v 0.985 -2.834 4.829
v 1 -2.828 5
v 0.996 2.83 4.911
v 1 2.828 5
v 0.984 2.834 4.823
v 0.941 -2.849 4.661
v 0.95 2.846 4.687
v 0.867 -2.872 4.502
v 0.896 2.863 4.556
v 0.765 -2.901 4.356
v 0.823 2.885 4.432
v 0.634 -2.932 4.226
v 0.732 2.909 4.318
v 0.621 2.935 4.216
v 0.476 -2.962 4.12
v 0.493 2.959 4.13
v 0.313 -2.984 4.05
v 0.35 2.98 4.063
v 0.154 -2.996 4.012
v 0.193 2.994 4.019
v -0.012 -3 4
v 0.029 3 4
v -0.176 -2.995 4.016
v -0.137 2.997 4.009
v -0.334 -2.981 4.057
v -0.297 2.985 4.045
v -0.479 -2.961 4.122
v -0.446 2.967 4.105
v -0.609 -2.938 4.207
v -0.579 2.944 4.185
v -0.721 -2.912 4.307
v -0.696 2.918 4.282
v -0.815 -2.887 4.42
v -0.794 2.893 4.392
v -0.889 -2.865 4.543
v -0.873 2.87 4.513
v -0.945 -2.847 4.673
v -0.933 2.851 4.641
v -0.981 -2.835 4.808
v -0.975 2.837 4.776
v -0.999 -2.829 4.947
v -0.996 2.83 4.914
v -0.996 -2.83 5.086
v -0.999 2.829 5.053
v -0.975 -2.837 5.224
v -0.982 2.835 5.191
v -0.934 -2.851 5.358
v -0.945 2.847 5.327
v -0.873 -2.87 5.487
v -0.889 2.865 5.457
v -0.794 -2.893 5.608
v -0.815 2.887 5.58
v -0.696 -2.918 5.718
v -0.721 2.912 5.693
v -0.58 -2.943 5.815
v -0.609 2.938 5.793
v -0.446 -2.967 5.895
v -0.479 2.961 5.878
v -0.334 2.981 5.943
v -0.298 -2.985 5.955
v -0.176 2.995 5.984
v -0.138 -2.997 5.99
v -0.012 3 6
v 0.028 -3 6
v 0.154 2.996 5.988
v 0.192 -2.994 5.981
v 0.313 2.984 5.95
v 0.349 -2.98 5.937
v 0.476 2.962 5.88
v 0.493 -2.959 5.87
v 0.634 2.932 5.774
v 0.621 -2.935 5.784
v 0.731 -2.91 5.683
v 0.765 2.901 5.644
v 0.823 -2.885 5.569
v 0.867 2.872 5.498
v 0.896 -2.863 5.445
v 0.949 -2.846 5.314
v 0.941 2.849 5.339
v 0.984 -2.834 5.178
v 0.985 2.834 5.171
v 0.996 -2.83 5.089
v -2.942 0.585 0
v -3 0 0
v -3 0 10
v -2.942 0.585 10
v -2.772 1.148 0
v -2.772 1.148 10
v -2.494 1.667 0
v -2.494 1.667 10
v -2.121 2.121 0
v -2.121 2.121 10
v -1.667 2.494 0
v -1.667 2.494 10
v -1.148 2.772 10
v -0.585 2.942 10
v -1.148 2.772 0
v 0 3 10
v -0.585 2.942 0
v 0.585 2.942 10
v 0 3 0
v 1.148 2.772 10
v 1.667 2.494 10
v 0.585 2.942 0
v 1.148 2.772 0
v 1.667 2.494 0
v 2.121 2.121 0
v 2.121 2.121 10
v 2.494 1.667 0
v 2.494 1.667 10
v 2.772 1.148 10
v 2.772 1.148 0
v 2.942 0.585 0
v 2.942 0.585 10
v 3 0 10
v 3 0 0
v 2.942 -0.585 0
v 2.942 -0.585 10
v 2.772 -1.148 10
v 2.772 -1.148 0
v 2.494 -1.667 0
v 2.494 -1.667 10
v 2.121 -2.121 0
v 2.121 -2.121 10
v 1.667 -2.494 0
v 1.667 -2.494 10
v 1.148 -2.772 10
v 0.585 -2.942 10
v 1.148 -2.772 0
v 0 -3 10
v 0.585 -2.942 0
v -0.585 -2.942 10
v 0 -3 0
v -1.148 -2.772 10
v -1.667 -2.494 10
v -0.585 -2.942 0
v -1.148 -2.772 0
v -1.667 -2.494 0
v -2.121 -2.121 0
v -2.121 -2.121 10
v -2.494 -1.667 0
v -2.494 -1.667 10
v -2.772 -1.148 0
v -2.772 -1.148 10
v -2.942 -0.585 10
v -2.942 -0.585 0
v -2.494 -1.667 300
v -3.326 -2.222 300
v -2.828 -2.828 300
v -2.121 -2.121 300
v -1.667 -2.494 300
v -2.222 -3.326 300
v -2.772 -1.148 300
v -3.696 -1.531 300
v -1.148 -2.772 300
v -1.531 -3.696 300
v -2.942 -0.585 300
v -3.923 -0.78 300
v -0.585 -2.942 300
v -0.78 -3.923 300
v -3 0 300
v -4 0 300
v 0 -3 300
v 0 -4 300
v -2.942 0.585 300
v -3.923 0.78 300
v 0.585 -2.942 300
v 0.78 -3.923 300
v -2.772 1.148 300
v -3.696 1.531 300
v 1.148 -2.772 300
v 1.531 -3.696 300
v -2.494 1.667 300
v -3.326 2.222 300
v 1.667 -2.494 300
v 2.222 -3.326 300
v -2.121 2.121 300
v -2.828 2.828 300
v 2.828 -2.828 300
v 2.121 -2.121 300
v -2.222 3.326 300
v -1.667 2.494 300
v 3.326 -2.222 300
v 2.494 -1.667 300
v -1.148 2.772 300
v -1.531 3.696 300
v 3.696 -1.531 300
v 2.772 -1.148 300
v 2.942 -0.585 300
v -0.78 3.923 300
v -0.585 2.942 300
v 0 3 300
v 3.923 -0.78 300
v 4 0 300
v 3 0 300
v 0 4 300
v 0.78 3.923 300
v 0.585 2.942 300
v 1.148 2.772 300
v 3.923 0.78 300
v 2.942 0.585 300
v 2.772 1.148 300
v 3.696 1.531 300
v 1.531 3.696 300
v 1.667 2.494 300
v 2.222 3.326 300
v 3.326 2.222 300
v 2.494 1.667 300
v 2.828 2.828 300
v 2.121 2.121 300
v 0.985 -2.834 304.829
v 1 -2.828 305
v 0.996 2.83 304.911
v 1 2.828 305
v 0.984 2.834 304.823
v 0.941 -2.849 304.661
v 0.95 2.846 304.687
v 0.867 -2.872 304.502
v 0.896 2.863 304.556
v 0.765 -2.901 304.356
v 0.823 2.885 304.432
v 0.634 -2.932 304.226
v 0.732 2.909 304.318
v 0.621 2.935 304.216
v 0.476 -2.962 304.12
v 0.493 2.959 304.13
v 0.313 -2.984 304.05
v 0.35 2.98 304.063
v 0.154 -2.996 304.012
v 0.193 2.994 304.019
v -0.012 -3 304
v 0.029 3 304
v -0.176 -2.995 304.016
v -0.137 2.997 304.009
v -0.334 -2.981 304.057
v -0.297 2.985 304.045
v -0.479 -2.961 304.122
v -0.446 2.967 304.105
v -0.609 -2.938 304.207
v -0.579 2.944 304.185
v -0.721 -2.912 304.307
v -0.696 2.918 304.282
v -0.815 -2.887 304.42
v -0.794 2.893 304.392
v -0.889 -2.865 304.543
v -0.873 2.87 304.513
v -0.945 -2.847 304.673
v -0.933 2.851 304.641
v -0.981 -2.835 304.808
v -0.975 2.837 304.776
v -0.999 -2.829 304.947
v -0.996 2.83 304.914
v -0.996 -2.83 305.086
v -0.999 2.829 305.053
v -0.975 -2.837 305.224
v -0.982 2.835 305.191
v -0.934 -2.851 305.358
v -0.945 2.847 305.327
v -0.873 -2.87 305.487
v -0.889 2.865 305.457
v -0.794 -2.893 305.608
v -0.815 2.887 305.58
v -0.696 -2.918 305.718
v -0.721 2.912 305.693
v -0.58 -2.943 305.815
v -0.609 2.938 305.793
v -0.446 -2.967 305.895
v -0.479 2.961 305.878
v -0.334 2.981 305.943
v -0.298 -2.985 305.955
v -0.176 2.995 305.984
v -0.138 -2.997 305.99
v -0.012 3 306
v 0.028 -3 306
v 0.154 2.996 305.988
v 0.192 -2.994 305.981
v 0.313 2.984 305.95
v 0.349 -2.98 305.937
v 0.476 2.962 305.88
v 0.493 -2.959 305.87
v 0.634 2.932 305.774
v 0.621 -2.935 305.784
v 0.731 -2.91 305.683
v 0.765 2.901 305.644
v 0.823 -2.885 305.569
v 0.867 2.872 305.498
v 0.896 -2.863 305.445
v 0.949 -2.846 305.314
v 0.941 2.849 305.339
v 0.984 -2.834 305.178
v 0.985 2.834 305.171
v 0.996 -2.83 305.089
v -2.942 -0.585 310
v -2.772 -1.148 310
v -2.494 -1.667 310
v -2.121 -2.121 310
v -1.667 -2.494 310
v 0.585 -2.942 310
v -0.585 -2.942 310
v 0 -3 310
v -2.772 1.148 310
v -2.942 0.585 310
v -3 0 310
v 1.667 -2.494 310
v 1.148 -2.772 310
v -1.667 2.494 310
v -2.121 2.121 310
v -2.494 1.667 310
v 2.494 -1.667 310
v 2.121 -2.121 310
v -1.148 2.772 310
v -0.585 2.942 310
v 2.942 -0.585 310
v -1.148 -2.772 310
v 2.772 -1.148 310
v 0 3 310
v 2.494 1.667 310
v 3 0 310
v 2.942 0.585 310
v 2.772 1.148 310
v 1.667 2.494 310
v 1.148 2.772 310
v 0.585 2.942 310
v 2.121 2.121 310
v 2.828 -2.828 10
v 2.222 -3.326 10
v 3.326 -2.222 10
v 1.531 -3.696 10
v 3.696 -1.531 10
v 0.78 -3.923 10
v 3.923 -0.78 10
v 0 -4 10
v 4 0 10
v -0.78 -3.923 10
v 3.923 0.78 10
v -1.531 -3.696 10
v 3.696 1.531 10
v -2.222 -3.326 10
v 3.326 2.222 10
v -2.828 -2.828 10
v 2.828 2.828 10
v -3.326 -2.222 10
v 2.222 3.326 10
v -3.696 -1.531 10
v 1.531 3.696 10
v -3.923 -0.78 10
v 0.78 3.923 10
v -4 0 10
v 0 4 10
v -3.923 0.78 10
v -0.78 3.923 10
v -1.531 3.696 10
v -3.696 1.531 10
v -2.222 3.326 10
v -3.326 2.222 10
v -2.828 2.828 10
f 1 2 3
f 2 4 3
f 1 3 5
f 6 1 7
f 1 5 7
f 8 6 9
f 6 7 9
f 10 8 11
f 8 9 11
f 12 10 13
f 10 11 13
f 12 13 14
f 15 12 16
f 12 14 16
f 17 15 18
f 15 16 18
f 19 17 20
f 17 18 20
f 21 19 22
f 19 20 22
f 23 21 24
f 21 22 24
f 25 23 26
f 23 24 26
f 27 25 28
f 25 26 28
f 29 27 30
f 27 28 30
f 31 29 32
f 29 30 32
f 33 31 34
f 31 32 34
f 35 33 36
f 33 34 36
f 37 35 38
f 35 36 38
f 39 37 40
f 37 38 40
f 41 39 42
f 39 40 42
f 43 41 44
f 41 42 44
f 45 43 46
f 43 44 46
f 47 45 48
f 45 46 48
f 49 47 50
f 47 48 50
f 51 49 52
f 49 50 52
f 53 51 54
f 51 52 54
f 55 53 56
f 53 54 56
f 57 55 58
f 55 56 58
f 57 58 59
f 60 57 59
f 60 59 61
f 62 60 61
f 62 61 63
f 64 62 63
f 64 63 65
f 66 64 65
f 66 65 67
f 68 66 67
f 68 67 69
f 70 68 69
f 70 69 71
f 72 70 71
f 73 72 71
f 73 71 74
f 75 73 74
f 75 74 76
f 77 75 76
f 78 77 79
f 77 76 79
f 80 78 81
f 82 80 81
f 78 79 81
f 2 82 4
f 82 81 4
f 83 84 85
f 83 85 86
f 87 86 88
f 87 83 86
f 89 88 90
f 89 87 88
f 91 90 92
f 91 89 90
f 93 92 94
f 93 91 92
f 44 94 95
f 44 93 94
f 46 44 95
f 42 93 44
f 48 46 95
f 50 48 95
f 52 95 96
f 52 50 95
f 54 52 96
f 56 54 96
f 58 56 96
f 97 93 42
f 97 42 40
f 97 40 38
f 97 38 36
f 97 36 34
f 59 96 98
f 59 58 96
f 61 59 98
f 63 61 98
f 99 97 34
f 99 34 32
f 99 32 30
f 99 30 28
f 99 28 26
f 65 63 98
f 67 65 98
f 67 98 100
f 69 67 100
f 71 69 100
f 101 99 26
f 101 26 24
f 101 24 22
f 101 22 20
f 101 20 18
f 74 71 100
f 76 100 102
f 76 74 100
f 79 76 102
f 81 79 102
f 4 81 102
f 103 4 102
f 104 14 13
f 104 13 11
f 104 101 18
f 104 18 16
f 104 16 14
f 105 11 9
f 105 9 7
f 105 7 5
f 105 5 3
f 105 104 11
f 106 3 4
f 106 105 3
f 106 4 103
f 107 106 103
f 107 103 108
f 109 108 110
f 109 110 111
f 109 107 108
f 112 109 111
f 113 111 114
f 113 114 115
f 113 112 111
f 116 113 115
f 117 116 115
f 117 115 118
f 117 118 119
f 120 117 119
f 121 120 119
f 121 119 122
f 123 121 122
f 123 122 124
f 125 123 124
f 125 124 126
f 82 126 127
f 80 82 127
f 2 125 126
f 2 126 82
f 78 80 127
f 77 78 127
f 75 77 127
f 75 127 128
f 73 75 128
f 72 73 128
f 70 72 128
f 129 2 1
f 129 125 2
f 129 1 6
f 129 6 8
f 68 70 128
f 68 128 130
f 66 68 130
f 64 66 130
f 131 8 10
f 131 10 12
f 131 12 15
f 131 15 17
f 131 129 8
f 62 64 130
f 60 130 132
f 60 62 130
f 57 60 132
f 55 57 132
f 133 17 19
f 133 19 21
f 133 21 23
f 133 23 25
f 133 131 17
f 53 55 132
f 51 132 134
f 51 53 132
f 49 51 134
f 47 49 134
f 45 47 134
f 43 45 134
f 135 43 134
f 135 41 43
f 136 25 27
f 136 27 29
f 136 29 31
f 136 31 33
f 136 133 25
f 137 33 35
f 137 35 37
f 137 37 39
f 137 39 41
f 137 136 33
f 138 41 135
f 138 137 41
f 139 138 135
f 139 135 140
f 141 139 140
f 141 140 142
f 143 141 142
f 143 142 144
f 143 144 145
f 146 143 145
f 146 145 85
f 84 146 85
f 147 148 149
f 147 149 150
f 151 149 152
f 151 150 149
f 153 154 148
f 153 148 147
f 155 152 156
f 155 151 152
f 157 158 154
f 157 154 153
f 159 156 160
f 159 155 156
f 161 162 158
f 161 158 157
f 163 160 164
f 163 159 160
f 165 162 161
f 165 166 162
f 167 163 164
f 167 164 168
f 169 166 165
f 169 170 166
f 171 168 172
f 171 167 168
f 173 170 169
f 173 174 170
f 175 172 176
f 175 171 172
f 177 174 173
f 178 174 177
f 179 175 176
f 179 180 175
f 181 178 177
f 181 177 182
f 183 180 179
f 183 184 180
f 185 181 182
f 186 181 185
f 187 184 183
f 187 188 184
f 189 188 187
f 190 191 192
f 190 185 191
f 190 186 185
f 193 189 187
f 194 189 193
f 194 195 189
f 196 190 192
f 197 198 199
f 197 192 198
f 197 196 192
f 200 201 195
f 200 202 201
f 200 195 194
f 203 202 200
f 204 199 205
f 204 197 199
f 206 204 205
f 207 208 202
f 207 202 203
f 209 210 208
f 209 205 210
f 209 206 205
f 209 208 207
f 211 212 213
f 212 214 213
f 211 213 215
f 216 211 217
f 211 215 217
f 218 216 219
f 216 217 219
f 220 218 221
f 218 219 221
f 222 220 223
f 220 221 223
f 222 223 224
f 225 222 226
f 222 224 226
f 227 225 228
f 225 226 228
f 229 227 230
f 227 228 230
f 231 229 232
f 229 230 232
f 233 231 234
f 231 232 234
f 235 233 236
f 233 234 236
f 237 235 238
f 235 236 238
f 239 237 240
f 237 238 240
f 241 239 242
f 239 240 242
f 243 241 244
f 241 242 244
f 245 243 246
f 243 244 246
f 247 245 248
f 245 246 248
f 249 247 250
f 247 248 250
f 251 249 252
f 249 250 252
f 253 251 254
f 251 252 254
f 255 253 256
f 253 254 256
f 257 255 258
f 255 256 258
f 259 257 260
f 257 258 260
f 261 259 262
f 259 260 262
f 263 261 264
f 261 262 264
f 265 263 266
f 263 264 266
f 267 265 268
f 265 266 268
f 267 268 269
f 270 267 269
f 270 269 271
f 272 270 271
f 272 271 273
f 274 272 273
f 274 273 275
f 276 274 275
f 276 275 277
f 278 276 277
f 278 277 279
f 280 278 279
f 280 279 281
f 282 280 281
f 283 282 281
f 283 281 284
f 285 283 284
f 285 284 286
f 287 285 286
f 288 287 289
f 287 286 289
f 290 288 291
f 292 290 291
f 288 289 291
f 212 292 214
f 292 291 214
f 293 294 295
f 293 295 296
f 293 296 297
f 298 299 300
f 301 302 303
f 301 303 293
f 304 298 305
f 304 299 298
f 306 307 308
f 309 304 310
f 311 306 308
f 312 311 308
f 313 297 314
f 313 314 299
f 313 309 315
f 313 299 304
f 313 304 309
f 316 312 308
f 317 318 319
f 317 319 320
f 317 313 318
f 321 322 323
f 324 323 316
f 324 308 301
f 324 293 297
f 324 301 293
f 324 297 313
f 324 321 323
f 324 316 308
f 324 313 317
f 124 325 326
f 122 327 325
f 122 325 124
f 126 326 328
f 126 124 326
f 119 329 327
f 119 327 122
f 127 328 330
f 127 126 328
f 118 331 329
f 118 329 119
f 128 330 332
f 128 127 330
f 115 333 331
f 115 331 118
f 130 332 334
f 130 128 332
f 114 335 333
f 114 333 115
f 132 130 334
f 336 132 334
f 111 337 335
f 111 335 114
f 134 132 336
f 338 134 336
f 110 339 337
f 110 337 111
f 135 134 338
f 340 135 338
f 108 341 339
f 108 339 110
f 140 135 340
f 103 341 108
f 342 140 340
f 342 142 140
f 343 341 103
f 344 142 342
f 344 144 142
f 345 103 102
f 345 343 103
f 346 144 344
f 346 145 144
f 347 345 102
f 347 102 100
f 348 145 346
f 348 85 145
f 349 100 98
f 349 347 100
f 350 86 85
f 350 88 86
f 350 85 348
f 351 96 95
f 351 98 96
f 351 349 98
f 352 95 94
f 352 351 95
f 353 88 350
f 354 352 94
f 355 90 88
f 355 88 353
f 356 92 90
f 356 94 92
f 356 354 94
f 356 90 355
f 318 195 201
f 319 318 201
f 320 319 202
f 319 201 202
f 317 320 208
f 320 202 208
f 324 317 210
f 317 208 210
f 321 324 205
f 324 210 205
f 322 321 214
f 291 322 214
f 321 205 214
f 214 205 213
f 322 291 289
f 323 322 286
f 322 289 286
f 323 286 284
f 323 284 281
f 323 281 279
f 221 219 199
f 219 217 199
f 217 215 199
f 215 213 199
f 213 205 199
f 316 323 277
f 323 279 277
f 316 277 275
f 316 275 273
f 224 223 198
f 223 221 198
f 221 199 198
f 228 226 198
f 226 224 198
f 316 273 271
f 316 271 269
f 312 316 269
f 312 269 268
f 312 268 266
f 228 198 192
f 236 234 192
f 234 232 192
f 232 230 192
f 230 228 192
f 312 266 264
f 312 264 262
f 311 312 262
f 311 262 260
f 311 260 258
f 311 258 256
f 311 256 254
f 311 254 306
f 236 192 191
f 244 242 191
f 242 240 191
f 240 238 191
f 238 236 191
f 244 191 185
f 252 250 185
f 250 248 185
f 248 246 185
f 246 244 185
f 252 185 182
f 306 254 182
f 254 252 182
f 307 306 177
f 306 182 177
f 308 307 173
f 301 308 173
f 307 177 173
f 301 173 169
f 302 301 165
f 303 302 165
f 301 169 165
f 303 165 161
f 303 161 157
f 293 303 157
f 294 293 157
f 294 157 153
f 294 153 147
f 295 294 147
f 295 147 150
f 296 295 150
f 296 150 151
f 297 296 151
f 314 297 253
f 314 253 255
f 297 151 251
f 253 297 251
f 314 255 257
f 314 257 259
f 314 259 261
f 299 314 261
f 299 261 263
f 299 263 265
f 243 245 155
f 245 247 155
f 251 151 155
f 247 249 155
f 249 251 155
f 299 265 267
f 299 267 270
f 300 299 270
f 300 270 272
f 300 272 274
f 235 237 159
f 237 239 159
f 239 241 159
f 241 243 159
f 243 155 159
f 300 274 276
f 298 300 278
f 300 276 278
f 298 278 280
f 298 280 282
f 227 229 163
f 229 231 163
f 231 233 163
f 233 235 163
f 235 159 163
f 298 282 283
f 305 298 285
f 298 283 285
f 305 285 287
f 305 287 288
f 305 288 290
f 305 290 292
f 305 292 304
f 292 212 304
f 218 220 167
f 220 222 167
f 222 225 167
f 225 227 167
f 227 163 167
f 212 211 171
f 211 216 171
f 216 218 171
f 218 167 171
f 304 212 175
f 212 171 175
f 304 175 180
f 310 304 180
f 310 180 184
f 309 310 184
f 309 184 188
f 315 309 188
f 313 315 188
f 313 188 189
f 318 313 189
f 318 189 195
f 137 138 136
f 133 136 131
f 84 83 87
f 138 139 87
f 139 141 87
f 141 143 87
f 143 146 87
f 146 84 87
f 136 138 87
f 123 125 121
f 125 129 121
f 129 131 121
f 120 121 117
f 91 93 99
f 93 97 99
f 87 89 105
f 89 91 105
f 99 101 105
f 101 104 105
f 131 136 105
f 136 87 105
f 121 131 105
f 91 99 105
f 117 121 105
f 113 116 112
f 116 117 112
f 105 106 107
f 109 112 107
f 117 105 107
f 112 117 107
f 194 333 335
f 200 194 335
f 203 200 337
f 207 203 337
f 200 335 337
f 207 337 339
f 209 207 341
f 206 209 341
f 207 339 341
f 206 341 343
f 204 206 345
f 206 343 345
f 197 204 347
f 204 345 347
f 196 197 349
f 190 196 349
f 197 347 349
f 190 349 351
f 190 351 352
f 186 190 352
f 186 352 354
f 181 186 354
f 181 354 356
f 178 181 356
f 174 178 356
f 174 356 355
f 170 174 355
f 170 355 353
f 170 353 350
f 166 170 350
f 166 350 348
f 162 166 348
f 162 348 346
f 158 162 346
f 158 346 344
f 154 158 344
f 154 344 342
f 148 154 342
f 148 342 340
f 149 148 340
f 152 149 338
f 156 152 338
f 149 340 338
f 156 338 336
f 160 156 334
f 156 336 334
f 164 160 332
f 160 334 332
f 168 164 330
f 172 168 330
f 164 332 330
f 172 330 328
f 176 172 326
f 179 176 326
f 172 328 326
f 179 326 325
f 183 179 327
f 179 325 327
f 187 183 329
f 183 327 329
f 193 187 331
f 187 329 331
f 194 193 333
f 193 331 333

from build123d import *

# Parameters (mm, degrees)
SKETCH1_R           = 4
BOSS_EXTRUDE1_DEPTH = 300
SKETCH2_R           = 3
BOSS_EXTRUDE2_DEPTH = 10
SKETCH3_R           = 1
CUT_EXTRUDE1_DEPTH  = 3
SKETCH4_R           = 4
SKETCH4_R_2         = 3
CUT_EXTRUDE2_DEPTH  = 10
SKETCH5_R           = 1
CUT_EXTRUDE3_DEPTH  = 3


with BuildPart() as part:
    # Sketch1 → Boss-Extrude1 (new body)
    with BuildSketch(Plane.XY):
        Circle(SKETCH1_R)
    extrude(amount=BOSS_EXTRUDE1_DEPTH)

    # Sketch2 → Boss-Extrude2 (add)
    with BuildSketch(Plane.XY.offset(300)):
        Circle(SKETCH2_R)
    extrude(amount=BOSS_EXTRUDE2_DEPTH)

    # Sketch3 → Cut-Extrude1 (cut, symmetric)
    with BuildSketch(Plane(origin=(0, 0, 0), x_dir=(1, 0, 0), z_dir=(0, 1, 0))):
        with Locations((0, -305)):
            Circle(SKETCH3_R)
    extrude(amount=CUT_EXTRUDE1_DEPTH, both=True, mode=Mode.SUBTRACT)

    # Sketch4 → Cut-Extrude2 (cut)
    with BuildSketch(Plane(origin=(0, 0, 0), x_dir=(-1, 0, 0), z_dir=(0, 0, -1))):
        Circle(SKETCH4_R)
        Circle(SKETCH4_R_2, mode=Mode.SUBTRACT)
    extrude(amount=-CUT_EXTRUDE2_DEPTH, mode=Mode.SUBTRACT)

    # Sketch5 → Cut-Extrude3 (cut, symmetric)
    with BuildSketch(Plane(origin=(0, 0, 0), x_dir=(1, 0, 0), z_dir=(0, 1, 0))):
        with Locations((0, -5)):
            Circle(SKETCH5_R)
    extrude(amount=CUT_EXTRUDE3_DEPTH, both=True, mode=Mode.SUBTRACT)


solid = part.part
